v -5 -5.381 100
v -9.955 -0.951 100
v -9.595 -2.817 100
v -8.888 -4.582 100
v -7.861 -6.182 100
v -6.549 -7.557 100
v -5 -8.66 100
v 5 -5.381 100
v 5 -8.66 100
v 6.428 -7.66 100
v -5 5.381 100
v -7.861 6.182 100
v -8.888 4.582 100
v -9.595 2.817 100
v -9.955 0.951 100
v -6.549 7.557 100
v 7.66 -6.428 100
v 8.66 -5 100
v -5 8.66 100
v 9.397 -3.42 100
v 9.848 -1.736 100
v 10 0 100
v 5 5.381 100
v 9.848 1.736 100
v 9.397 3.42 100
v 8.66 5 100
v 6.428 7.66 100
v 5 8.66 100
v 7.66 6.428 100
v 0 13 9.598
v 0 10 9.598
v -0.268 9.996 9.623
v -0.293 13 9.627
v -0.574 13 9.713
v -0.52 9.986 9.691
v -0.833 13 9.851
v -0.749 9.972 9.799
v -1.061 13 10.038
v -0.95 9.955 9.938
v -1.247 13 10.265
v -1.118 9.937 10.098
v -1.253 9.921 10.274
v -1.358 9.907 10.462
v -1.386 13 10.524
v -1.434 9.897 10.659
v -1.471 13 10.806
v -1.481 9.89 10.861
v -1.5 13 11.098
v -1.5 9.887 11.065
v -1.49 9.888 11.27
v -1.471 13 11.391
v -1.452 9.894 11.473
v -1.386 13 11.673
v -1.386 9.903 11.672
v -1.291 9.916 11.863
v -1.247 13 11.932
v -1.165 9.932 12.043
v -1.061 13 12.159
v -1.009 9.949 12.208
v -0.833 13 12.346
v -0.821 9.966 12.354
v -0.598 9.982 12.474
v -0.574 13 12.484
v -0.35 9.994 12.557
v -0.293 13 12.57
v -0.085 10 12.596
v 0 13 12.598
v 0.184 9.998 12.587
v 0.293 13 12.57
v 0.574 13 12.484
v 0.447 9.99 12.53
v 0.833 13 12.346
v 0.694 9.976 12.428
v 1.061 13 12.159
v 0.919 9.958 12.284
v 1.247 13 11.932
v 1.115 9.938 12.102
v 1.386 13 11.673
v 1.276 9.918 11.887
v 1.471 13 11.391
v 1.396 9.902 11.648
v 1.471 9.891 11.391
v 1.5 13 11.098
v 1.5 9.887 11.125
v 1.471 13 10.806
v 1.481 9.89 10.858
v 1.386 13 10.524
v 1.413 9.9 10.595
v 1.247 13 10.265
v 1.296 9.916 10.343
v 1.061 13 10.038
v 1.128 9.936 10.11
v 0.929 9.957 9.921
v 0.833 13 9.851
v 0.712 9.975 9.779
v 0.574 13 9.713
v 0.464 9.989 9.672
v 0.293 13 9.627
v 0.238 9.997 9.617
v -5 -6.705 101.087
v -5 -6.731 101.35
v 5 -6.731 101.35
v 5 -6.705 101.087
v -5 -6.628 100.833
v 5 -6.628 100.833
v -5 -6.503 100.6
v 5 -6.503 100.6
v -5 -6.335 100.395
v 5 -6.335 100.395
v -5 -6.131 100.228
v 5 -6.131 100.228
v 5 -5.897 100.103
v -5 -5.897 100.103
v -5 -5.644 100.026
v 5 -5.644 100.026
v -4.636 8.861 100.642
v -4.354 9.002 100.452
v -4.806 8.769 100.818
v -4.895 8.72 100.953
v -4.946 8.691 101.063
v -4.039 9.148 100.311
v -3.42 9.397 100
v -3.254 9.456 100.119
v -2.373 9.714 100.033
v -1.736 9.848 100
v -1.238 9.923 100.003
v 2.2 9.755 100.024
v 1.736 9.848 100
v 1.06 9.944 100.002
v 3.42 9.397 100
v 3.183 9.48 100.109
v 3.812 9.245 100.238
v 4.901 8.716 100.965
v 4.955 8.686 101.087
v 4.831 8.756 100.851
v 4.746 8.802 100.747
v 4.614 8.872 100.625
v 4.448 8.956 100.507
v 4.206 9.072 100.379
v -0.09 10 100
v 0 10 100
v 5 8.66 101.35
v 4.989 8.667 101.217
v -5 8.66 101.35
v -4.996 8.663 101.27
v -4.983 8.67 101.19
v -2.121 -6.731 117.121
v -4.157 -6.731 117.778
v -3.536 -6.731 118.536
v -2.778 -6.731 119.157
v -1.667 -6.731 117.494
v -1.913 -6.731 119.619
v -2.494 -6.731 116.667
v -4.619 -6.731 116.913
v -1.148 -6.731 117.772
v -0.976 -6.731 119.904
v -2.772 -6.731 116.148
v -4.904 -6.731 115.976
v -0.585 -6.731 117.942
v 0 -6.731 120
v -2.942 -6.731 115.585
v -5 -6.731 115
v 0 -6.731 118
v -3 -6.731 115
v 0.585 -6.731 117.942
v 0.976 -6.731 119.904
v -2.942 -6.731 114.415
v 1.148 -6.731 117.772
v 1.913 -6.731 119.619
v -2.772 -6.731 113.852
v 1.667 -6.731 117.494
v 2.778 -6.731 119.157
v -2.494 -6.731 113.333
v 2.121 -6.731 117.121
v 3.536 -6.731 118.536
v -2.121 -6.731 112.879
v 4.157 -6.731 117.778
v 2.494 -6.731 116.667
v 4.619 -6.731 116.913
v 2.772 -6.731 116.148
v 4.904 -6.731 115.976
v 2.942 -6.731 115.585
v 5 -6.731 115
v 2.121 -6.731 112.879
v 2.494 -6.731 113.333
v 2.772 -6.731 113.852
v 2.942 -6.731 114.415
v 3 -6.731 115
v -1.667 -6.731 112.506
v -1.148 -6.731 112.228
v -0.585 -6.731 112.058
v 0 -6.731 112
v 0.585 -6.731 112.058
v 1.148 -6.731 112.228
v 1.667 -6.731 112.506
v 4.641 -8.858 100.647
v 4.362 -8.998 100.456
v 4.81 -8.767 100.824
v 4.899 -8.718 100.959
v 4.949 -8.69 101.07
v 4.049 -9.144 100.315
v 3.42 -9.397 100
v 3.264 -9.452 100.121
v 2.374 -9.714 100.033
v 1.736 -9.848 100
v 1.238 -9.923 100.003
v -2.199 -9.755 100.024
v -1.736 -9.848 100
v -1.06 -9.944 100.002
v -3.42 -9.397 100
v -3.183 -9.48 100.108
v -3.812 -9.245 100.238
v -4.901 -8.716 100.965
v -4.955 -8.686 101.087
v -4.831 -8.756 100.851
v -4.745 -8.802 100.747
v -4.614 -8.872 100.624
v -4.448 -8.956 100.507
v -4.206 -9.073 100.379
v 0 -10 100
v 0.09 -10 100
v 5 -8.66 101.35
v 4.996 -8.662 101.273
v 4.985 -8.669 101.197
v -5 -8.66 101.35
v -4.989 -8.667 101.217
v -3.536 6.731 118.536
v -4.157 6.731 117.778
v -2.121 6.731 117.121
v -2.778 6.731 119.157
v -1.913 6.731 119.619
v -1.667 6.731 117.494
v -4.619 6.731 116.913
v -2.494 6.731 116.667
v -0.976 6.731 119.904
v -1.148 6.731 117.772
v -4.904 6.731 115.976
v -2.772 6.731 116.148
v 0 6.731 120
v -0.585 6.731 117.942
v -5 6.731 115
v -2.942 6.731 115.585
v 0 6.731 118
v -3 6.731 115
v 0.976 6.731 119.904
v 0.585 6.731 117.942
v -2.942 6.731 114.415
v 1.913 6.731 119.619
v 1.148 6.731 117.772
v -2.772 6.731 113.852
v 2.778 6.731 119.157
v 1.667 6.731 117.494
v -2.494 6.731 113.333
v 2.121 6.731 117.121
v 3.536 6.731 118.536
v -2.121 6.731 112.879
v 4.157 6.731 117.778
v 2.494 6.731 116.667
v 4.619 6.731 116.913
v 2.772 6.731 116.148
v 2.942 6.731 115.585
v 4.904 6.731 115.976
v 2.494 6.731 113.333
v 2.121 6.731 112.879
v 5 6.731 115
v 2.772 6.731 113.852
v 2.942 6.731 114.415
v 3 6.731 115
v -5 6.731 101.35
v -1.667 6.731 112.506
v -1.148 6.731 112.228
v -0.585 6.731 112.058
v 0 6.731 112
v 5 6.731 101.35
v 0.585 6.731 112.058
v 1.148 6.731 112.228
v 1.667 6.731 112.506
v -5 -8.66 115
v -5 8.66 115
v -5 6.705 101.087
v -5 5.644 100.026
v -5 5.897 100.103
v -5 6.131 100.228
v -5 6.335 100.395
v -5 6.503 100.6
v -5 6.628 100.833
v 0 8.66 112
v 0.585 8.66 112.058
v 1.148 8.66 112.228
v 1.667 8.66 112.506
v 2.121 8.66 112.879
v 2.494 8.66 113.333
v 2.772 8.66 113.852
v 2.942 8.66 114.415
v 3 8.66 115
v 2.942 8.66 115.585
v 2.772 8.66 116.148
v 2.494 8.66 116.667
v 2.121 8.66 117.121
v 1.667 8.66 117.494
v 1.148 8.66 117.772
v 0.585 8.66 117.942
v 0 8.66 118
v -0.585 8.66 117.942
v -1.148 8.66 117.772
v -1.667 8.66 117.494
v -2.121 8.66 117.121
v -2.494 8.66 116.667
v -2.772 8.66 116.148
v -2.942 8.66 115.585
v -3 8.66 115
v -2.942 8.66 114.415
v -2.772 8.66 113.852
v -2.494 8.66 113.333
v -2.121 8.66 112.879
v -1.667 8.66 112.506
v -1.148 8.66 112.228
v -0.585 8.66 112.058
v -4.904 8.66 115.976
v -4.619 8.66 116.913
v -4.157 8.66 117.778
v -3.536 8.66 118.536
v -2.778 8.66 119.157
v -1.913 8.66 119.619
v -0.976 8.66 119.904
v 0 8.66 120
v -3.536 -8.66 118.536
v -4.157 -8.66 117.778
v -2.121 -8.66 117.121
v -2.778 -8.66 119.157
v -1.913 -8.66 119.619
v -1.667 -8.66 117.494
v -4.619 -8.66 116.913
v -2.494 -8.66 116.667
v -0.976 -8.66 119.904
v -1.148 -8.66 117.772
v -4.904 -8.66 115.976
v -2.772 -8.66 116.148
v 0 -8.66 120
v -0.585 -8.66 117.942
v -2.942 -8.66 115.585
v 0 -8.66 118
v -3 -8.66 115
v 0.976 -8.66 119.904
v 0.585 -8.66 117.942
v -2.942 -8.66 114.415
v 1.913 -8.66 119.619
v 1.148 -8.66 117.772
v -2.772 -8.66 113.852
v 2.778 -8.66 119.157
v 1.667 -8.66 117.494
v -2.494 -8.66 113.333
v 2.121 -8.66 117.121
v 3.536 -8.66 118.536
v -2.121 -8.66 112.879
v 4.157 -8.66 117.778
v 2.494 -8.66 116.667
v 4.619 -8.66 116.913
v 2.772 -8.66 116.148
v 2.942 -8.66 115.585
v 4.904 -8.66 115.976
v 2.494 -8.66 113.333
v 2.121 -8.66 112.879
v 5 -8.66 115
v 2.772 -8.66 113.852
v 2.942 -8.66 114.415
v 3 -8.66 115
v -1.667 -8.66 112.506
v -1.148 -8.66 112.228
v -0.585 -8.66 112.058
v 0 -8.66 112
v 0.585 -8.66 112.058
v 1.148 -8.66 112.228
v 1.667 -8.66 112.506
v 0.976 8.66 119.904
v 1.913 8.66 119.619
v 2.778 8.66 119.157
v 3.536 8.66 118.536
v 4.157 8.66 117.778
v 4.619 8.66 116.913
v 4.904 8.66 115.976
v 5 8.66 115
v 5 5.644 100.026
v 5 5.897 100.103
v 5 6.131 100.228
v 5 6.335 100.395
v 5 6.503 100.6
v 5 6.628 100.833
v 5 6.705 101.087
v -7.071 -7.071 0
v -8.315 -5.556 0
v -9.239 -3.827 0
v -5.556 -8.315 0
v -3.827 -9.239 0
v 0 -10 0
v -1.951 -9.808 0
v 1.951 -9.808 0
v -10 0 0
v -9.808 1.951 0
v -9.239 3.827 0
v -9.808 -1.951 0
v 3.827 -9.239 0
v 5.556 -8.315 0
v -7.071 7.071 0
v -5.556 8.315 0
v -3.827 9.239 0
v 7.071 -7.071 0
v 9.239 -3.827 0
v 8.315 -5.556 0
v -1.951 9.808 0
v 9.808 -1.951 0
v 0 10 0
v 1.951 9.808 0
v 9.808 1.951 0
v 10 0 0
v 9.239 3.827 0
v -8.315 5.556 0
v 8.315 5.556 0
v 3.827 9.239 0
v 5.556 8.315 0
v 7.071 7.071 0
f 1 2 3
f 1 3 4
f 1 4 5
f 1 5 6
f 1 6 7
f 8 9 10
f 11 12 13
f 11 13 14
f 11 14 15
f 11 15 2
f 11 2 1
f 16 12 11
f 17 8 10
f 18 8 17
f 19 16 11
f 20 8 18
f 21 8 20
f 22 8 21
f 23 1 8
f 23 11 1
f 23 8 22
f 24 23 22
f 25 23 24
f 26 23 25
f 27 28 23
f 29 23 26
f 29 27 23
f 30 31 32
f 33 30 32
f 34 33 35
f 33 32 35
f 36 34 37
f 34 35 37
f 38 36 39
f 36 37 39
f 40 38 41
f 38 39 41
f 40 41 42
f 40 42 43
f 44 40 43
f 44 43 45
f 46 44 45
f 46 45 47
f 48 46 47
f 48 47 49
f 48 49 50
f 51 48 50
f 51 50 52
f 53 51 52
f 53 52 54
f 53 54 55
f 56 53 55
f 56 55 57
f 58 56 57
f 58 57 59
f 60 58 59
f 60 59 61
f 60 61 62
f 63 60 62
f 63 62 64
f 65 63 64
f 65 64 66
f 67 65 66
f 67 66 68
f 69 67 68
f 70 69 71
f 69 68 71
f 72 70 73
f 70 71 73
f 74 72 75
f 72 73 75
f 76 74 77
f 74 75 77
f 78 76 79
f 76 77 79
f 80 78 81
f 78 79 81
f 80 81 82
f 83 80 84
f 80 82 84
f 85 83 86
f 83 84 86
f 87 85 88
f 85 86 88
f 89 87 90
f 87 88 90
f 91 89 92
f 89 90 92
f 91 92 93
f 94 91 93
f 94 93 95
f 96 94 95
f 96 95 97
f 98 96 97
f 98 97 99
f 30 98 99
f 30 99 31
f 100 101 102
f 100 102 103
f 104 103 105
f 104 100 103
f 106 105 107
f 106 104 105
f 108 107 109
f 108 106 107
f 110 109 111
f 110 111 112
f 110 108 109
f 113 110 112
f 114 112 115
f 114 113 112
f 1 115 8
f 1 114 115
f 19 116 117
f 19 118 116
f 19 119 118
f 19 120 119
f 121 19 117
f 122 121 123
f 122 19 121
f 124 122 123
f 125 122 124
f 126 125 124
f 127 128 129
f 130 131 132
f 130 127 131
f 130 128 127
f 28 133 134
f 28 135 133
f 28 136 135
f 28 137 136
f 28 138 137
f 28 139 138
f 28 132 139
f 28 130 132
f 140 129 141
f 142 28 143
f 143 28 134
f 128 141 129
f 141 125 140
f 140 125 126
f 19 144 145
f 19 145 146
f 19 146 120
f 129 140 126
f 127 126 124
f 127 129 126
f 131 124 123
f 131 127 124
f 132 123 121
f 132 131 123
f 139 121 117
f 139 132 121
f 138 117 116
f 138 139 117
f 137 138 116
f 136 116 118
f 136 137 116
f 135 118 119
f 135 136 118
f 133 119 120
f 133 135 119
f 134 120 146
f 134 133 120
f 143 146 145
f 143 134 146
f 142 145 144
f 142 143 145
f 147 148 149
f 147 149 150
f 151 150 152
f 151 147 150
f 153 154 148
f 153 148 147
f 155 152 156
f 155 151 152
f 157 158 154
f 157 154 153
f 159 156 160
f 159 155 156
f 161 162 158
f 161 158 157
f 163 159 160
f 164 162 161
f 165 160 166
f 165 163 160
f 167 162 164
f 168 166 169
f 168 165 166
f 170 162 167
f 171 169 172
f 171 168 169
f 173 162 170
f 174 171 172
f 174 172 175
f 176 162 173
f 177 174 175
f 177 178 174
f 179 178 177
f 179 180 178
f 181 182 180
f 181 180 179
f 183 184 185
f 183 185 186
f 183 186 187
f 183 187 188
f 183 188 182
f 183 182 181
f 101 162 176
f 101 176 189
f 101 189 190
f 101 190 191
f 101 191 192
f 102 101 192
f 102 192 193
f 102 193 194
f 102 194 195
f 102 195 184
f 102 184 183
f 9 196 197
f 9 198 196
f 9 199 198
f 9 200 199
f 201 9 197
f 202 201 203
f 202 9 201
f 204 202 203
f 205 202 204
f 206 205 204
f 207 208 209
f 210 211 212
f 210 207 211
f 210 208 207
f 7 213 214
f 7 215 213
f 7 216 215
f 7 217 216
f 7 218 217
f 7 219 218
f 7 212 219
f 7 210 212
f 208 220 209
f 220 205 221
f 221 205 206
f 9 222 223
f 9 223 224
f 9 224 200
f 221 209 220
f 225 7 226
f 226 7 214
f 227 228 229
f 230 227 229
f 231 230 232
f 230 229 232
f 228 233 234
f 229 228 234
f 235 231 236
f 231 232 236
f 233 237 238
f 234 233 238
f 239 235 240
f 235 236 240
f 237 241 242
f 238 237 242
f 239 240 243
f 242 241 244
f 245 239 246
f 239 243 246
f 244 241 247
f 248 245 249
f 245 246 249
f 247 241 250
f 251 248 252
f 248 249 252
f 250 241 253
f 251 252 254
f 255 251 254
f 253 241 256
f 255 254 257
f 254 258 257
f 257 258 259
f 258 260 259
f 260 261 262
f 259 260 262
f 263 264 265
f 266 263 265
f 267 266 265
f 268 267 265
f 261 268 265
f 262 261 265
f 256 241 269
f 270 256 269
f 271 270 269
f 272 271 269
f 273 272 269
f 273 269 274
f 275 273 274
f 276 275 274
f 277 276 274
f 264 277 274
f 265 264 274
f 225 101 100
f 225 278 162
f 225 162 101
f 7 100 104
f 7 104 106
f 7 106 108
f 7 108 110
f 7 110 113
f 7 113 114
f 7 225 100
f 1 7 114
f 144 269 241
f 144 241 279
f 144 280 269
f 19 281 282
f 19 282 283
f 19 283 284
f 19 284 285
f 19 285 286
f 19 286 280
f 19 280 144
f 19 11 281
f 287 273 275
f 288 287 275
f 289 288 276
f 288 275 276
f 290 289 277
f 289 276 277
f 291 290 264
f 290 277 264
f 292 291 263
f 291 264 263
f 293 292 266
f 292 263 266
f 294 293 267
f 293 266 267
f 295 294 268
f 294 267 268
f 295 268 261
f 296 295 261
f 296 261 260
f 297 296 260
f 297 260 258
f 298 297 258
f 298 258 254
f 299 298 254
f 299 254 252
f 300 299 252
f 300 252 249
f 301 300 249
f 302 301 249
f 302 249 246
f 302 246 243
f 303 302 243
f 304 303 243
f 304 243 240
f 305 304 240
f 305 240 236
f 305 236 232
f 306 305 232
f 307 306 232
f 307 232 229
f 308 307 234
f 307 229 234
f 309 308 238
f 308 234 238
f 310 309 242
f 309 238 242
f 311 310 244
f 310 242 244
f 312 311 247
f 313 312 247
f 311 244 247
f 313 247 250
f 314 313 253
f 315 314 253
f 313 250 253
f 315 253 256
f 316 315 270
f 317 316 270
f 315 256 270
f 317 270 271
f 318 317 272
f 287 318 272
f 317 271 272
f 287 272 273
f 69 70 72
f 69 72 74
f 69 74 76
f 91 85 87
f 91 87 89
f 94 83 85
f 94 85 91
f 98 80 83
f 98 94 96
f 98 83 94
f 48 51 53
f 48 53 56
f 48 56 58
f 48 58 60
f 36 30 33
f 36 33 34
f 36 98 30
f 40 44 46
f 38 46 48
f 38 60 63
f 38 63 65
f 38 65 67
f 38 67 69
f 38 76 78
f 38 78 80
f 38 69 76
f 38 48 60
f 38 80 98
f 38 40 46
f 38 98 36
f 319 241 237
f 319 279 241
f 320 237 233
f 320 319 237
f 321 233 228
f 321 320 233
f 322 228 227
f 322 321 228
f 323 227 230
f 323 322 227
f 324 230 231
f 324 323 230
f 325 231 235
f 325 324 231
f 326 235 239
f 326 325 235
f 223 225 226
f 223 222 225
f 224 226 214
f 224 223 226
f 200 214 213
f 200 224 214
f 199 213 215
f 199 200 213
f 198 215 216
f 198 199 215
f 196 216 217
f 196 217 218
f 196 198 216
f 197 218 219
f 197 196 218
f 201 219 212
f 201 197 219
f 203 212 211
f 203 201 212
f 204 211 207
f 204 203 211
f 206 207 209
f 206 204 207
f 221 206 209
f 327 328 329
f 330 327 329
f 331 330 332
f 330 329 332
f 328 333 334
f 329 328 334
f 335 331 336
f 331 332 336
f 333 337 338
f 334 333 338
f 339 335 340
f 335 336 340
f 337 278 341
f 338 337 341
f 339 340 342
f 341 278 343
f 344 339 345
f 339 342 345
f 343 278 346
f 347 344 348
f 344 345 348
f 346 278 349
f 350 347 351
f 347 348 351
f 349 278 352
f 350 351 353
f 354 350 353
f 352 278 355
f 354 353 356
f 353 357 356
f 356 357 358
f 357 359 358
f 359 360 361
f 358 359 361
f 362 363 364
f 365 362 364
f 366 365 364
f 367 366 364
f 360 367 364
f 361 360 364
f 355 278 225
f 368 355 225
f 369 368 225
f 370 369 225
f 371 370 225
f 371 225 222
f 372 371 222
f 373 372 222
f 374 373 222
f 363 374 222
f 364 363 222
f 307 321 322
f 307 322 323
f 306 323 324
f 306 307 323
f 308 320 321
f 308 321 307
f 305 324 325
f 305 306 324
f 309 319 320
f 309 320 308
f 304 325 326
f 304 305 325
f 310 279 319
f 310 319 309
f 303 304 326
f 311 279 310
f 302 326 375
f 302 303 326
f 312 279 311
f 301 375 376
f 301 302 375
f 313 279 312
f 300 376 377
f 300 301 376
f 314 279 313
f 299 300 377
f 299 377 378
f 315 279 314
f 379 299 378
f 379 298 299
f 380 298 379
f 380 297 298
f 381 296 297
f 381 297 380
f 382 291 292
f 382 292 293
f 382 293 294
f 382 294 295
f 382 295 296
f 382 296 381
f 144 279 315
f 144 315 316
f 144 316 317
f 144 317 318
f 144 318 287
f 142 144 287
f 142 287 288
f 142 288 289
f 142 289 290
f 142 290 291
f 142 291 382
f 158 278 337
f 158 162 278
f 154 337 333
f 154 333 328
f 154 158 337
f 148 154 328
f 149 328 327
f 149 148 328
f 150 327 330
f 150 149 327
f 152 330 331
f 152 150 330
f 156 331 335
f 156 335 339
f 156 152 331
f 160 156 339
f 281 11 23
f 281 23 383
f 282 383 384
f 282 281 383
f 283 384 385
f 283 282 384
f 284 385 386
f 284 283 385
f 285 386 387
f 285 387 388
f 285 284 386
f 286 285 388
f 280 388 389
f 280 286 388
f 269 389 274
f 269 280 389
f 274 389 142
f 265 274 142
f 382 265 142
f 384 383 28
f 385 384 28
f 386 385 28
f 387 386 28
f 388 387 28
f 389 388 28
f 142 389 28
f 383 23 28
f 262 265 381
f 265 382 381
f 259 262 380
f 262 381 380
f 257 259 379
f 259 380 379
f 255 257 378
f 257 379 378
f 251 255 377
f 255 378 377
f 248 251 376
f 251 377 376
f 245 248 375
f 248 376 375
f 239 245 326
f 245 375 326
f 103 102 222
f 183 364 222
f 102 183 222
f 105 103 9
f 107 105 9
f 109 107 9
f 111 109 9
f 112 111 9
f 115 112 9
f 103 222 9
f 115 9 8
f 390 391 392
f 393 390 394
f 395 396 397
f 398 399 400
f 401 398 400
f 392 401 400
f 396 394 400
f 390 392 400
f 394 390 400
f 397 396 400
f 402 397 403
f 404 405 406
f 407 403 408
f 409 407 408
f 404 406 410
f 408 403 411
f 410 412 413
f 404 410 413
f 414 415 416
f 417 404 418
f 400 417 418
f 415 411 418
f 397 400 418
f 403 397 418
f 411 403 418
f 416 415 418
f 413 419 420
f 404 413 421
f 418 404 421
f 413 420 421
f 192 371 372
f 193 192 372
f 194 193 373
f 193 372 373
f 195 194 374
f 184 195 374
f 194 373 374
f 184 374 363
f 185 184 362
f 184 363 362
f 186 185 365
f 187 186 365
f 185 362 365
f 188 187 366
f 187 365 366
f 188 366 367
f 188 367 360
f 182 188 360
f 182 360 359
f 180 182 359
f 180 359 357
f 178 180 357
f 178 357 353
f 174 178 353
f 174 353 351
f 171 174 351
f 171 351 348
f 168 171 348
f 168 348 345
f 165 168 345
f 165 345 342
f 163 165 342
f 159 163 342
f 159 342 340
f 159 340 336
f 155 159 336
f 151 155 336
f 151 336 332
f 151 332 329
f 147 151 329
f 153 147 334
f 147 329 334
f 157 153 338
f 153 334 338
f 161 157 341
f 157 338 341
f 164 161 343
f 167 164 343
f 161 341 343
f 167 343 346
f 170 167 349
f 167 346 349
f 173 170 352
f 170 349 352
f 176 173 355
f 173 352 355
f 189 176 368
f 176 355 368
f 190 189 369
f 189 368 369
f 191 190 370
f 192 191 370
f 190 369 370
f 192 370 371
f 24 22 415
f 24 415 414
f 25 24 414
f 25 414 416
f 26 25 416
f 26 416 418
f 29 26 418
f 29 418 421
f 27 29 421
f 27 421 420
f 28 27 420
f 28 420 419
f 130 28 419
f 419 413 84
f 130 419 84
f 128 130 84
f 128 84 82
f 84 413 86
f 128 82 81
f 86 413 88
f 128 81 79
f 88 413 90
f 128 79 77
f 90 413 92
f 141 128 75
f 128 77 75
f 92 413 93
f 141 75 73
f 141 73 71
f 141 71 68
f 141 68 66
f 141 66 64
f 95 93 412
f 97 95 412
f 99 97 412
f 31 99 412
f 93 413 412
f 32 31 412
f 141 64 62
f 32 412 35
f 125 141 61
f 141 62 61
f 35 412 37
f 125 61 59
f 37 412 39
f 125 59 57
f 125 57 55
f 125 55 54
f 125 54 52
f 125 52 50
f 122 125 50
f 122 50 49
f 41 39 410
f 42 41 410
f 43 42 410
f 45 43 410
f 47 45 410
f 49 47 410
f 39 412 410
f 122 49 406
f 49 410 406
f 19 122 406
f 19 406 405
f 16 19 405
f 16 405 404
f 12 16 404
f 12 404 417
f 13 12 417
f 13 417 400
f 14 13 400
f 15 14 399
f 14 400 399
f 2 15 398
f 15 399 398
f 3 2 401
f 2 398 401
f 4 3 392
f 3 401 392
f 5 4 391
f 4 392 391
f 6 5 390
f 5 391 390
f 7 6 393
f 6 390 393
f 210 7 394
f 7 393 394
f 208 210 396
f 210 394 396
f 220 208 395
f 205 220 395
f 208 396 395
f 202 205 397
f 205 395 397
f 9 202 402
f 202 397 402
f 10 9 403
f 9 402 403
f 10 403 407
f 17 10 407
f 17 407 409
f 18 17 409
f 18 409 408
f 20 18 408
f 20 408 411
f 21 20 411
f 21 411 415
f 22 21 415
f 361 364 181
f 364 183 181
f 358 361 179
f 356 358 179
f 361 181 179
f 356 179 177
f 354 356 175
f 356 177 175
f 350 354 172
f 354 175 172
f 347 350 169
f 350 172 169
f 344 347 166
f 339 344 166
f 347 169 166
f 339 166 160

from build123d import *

# Parameters (mm, degrees)
SKETCH1_R           = 10
BOSS_EXTRUDE1_DEPTH = 100
SKETCH3_W           = 10
SKETCH3_H           = 1.929631273
BOSS_EXTRUDE3_DEPTH = 20
SKETCH4_R           = 3
CUT_EXTRUDE1_DEPTH  = 122.853211204
FILLET2_R           = 5
FILLET3_R           = 1.35
SKETCH7_R           = 1.5
BOSS_EXTRUDE4_DEPTH = 13


# Some blends are built 0.0001 mm under size
with BuildPart() as part:
    # Sketch1 → Boss-Extrude1 (new body)
    with BuildSketch(Plane(origin=(0, 0, 0), x_dir=(0, 1, 0), z_dir=(0, 0, 1))):
        with Locations(Location((0, 0, 0), (0, 0, 270))):
            Circle(SKETCH1_R)
    extrude(amount=BOSS_EXTRUDE1_DEPTH)

    # Sketch3 → Boss-Extrude3 (add)
    with BuildSketch(Plane.XY.offset(100)):
        with Locations((0, 7.695438402)):
            Rectangle(SKETCH3_W, SKETCH3_H)
        with Locations((0, -7.695438402)):
            Rectangle(SKETCH3_W, SKETCH3_H)
    extrude(amount=BOSS_EXTRUDE3_DEPTH)

    # Sketch4 → Cut-Extrude1 (cut, through all)
    with BuildSketch(Plane.XZ.offset(8.660254038)):
        with Locations(Location((0, 115, 0), (0, 0, 270))):
            Circle(SKETCH4_R)
    extrude(amount=-CUT_EXTRUDE1_DEPTH, mode=Mode.SUBTRACT)

    # Fillet2
    fillet2_edges = [part.edges().sort_by_distance(p)[0] for p in [
        (-5, 7.695438402, 120),
        (5, 7.695438402, 120),
        (-5, -7.695438402, 120),
        (5, -7.695438402, 120),
    ]]
    fillet(fillet2_edges, radius=FILLET2_R - 0.0001)  # a hair under: the kernel refuses the full size

    # Fillet3
    # the kernel refuses this fillet: 1.35 mm, written as the material it adds along each edge
    with BuildSketch(Plane(origin=(-5, -6.730622765, 100), x_dir=(0, 0, 1), z_dir=(1, 0, 0)), Plane(origin=(-5, 6.730622765, 100), x_dir=(0, -1, 0), z_dir=(1, 0, 0))) as fillet3_piece_1:
        with BuildLine():
            CenterArc((FILLET3_R, -FILLET3_R), FILLET3_R, 90, 90)
            Line((0, -FILLET3_R), (0, 0))
            Line((0, 0), (FILLET3_R, 0))
        make_face()
    extrude(amount=10)
    with BuildSketch(Plane(origin=(5, 8.660254038, 100), x_dir=(0, 1, 0), z_dir=(-1, 0, 0))) as fillet3_piece_2_section:
        with BuildLine():
            CenterArc((FILLET3_R, -FILLET3_R), FILLET3_R, 90, 90)
            Line((0, -FILLET3_R), (0, 0))
            Line((0, 0), (FILLET3_R, 0))
        make_face()
    fillet3_piece_2 = extrude(amount=10, mode=Mode.PRIVATE)
    fillet3_piece_2 = fillet3_piece_2 & Plane(origin=(0, 0, 100.331461228), x_dir=(1, 0, 0), z_dir=(0, 0, -1)) * Cylinder(10, 26, mode=Mode.PRIVATE)
    add(fillet3_piece_2)
    with BuildSketch(Plane(origin=(5, -8.660254038, 100), x_dir=(0, 0, 1), z_dir=(-1, 0, 0))) as fillet3_piece_3_section:
        with BuildLine():
            CenterArc((FILLET3_R, -FILLET3_R), FILLET3_R, 90, 90)
            Line((0, -FILLET3_R), (0, 0))
            Line((0, 0), (FILLET3_R, 0))
        make_face()
    fillet3_piece_3 = extrude(amount=10, mode=Mode.PRIVATE)
    fillet3_piece_3 = fillet3_piece_3 & Plane(origin=(0, 0, 100.331460994), x_dir=(1, 0, 0), z_dir=(0, 0, -1)) * Cylinder(10, 26, mode=Mode.PRIVATE)
    add(fillet3_piece_3)

    # Sketch7 → Boss-Extrude4 (add)
    with BuildSketch(Plane(origin=(0, 0, 0), x_dir=(-1, 0, 0), z_dir=(0, 1, 0))):
        with Locations(Location((0, 11.098495107, 0), (0, 0, 270))):
            Circle(SKETCH7_R)
    extrude(amount=BOSS_EXTRUDE4_DEPTH)


solid = part.part
